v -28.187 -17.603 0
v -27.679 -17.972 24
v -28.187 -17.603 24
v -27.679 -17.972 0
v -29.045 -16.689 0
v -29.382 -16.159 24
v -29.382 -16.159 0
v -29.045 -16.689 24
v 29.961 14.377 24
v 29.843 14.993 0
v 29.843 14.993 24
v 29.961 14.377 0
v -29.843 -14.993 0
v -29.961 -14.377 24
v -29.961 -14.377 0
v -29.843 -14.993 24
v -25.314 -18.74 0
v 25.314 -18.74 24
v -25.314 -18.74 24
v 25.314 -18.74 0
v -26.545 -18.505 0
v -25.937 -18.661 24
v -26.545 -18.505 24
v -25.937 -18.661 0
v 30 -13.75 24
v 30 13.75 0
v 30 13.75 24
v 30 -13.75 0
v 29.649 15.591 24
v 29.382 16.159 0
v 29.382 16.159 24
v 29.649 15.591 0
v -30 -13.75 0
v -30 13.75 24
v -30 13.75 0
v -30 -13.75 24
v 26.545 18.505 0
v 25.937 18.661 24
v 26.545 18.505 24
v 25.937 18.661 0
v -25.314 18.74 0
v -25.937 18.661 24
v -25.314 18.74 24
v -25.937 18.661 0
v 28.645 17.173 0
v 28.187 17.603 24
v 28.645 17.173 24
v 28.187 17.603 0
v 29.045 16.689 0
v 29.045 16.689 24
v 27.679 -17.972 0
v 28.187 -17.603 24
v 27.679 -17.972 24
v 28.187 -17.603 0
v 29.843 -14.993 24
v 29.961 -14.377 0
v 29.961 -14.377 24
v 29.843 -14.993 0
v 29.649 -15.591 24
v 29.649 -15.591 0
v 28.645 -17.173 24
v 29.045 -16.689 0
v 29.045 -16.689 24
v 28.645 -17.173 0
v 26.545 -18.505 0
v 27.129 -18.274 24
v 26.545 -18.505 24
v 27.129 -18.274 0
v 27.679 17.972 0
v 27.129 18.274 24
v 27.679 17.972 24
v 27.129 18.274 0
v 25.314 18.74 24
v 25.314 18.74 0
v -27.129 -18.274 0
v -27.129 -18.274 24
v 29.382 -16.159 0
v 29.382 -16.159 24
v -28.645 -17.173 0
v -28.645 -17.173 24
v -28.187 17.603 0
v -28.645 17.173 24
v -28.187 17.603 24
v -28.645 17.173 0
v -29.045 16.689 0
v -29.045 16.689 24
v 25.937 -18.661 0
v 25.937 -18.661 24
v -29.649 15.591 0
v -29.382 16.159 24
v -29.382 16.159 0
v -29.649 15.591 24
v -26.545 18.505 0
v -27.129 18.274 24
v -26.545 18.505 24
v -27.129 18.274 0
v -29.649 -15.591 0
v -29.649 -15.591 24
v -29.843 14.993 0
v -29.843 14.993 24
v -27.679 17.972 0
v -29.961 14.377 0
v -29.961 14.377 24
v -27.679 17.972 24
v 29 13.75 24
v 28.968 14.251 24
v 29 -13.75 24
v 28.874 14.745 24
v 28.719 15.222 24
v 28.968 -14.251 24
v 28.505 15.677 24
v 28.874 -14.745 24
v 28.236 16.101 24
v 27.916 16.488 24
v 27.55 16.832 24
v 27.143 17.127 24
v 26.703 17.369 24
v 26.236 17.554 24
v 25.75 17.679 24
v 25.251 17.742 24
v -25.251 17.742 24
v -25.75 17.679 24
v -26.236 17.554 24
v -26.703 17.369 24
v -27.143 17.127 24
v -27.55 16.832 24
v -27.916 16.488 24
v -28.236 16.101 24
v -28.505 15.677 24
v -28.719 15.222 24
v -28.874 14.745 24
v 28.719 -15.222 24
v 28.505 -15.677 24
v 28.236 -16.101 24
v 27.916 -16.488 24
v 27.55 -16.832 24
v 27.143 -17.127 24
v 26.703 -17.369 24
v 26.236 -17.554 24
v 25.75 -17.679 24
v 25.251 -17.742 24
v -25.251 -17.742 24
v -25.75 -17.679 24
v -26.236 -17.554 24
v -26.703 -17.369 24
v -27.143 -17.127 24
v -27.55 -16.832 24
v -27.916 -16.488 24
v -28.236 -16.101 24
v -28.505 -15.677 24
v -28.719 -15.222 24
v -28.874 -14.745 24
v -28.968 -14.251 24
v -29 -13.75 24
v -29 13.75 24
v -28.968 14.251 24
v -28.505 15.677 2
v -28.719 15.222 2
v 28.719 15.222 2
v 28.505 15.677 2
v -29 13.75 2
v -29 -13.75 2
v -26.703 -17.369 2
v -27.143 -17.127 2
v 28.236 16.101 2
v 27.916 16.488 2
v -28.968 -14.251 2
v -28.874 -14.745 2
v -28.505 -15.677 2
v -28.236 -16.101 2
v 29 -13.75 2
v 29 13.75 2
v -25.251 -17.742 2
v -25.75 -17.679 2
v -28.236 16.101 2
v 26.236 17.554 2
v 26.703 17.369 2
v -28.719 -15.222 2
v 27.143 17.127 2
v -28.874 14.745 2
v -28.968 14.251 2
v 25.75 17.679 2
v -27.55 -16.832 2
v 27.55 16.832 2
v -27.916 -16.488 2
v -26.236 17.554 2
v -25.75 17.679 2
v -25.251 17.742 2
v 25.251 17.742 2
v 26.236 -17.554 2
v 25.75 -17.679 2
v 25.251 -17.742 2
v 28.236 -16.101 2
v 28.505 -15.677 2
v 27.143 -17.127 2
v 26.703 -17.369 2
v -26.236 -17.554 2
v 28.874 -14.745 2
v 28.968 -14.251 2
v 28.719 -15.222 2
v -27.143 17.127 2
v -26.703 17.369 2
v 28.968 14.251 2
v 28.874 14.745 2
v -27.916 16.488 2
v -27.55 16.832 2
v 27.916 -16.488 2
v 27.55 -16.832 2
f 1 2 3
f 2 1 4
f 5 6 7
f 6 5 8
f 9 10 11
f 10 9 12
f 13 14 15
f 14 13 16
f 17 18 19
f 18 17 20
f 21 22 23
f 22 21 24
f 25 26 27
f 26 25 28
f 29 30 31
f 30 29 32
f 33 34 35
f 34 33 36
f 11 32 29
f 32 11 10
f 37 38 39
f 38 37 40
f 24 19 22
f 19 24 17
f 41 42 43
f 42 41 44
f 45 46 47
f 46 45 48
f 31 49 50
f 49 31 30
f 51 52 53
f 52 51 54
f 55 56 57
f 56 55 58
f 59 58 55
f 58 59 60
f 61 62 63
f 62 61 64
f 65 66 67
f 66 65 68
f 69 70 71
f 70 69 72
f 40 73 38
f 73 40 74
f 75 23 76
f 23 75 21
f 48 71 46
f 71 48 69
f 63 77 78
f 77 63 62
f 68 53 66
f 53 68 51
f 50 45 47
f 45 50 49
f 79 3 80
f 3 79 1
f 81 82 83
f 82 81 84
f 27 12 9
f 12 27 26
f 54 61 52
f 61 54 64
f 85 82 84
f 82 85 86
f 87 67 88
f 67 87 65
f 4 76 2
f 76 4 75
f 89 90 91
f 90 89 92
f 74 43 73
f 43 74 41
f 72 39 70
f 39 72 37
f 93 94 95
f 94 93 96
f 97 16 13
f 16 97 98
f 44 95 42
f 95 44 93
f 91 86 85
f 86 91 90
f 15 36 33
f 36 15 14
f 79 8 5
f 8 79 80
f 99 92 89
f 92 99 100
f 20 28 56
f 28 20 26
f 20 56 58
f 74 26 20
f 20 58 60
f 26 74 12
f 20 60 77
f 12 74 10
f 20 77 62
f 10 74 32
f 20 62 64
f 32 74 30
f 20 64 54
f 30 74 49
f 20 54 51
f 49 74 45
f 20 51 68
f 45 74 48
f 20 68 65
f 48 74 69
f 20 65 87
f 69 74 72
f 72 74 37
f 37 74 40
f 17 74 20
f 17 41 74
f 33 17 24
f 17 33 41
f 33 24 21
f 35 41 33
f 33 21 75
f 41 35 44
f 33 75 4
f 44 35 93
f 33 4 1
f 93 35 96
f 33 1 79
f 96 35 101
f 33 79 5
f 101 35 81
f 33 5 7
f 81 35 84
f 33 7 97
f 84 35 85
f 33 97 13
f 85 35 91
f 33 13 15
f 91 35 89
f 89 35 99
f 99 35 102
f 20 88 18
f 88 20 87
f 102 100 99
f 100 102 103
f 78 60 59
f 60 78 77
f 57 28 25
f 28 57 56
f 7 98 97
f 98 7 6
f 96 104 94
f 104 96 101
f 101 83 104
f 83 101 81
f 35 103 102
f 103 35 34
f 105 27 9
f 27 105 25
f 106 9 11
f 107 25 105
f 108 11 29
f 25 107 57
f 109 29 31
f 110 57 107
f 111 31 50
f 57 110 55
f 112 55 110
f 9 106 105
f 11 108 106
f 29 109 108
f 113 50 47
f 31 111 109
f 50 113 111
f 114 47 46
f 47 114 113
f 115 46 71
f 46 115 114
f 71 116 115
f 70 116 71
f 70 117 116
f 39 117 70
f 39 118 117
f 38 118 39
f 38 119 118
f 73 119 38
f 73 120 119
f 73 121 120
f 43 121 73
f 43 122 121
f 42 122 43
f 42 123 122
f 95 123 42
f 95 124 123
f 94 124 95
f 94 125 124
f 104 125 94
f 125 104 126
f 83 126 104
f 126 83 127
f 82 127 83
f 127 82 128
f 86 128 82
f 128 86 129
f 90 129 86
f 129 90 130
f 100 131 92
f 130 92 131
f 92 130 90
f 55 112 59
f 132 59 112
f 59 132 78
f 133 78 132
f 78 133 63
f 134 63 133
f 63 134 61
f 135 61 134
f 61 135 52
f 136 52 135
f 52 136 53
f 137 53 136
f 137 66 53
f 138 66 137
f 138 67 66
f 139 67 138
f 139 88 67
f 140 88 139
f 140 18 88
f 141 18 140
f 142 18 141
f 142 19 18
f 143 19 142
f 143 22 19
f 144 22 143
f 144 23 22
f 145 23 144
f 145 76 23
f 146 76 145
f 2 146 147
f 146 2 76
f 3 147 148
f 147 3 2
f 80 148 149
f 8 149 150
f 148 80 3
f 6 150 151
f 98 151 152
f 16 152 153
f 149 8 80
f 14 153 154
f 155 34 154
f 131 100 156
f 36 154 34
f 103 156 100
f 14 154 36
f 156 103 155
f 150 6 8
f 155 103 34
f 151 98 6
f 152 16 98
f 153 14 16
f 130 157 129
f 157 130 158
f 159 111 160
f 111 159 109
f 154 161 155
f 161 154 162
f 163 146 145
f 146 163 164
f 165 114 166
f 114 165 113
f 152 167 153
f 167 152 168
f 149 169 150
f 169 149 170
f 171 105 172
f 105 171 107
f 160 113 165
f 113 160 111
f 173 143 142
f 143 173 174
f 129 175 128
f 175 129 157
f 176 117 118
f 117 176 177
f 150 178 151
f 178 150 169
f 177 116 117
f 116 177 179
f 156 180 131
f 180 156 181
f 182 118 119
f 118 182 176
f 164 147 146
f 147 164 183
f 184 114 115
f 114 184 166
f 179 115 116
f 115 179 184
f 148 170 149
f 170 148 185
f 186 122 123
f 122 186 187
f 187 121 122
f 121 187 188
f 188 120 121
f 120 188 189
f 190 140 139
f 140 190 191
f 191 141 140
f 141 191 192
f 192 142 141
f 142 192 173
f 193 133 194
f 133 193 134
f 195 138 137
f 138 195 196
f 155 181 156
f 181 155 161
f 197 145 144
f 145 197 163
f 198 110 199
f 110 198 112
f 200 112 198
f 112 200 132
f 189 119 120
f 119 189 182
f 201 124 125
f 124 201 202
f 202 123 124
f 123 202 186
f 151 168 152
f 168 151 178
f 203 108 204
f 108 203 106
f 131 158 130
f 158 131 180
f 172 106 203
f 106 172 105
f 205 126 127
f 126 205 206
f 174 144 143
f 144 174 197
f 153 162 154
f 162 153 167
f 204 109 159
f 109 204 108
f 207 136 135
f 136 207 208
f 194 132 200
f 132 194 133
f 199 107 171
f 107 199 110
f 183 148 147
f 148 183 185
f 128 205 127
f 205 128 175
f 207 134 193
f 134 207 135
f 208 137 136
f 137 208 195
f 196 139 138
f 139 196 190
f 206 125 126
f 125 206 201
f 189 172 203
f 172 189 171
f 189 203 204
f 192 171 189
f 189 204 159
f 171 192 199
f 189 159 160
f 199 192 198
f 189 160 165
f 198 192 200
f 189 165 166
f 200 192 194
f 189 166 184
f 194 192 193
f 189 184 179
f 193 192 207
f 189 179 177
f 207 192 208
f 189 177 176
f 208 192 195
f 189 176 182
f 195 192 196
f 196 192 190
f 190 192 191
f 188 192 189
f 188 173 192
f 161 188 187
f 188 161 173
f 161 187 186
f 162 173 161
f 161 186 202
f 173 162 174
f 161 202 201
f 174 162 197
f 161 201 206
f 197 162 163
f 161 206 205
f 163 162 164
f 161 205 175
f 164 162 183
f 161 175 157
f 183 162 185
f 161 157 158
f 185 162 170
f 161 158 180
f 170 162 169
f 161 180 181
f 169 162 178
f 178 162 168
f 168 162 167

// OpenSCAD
$fn = 50;


difference() {
	union() {
		hull() {
			translate(v = [-25.0000000000, 13.7500000000, 0]) {
				cylinder(h = 24, r = 5);
			}
			translate(v = [25.0000000000, 13.7500000000, 0]) {
				cylinder(h = 24, r = 5);
			}
			translate(v = [-25.0000000000, -13.7500000000, 0]) {
				cylinder(h = 24, r = 5);
			}
			translate(v = [25.0000000000, -13.7500000000, 0]) {
				cylinder(h = 24, r = 5);
			}
		}
	}
	union() {
		translate(v = [0, 0, 2]) {
			#hull() {
				translate(v = [-25.0000000000, 13.7500000000, 0]) {
					cylinder(h = 22, r = 4);
				}
				translate(v = [25.0000000000, 13.7500000000, 0]) {
					cylinder(h = 22, r = 4);
				}
				translate(v = [-25.0000000000, -13.7500000000, 0]) {
					cylinder(h = 22, r = 4);
				}
				translate(v = [25.0000000000, -13.7500000000, 0]) {
					cylinder(h = 22, r = 4);
				}
			}
		}
	}
}
